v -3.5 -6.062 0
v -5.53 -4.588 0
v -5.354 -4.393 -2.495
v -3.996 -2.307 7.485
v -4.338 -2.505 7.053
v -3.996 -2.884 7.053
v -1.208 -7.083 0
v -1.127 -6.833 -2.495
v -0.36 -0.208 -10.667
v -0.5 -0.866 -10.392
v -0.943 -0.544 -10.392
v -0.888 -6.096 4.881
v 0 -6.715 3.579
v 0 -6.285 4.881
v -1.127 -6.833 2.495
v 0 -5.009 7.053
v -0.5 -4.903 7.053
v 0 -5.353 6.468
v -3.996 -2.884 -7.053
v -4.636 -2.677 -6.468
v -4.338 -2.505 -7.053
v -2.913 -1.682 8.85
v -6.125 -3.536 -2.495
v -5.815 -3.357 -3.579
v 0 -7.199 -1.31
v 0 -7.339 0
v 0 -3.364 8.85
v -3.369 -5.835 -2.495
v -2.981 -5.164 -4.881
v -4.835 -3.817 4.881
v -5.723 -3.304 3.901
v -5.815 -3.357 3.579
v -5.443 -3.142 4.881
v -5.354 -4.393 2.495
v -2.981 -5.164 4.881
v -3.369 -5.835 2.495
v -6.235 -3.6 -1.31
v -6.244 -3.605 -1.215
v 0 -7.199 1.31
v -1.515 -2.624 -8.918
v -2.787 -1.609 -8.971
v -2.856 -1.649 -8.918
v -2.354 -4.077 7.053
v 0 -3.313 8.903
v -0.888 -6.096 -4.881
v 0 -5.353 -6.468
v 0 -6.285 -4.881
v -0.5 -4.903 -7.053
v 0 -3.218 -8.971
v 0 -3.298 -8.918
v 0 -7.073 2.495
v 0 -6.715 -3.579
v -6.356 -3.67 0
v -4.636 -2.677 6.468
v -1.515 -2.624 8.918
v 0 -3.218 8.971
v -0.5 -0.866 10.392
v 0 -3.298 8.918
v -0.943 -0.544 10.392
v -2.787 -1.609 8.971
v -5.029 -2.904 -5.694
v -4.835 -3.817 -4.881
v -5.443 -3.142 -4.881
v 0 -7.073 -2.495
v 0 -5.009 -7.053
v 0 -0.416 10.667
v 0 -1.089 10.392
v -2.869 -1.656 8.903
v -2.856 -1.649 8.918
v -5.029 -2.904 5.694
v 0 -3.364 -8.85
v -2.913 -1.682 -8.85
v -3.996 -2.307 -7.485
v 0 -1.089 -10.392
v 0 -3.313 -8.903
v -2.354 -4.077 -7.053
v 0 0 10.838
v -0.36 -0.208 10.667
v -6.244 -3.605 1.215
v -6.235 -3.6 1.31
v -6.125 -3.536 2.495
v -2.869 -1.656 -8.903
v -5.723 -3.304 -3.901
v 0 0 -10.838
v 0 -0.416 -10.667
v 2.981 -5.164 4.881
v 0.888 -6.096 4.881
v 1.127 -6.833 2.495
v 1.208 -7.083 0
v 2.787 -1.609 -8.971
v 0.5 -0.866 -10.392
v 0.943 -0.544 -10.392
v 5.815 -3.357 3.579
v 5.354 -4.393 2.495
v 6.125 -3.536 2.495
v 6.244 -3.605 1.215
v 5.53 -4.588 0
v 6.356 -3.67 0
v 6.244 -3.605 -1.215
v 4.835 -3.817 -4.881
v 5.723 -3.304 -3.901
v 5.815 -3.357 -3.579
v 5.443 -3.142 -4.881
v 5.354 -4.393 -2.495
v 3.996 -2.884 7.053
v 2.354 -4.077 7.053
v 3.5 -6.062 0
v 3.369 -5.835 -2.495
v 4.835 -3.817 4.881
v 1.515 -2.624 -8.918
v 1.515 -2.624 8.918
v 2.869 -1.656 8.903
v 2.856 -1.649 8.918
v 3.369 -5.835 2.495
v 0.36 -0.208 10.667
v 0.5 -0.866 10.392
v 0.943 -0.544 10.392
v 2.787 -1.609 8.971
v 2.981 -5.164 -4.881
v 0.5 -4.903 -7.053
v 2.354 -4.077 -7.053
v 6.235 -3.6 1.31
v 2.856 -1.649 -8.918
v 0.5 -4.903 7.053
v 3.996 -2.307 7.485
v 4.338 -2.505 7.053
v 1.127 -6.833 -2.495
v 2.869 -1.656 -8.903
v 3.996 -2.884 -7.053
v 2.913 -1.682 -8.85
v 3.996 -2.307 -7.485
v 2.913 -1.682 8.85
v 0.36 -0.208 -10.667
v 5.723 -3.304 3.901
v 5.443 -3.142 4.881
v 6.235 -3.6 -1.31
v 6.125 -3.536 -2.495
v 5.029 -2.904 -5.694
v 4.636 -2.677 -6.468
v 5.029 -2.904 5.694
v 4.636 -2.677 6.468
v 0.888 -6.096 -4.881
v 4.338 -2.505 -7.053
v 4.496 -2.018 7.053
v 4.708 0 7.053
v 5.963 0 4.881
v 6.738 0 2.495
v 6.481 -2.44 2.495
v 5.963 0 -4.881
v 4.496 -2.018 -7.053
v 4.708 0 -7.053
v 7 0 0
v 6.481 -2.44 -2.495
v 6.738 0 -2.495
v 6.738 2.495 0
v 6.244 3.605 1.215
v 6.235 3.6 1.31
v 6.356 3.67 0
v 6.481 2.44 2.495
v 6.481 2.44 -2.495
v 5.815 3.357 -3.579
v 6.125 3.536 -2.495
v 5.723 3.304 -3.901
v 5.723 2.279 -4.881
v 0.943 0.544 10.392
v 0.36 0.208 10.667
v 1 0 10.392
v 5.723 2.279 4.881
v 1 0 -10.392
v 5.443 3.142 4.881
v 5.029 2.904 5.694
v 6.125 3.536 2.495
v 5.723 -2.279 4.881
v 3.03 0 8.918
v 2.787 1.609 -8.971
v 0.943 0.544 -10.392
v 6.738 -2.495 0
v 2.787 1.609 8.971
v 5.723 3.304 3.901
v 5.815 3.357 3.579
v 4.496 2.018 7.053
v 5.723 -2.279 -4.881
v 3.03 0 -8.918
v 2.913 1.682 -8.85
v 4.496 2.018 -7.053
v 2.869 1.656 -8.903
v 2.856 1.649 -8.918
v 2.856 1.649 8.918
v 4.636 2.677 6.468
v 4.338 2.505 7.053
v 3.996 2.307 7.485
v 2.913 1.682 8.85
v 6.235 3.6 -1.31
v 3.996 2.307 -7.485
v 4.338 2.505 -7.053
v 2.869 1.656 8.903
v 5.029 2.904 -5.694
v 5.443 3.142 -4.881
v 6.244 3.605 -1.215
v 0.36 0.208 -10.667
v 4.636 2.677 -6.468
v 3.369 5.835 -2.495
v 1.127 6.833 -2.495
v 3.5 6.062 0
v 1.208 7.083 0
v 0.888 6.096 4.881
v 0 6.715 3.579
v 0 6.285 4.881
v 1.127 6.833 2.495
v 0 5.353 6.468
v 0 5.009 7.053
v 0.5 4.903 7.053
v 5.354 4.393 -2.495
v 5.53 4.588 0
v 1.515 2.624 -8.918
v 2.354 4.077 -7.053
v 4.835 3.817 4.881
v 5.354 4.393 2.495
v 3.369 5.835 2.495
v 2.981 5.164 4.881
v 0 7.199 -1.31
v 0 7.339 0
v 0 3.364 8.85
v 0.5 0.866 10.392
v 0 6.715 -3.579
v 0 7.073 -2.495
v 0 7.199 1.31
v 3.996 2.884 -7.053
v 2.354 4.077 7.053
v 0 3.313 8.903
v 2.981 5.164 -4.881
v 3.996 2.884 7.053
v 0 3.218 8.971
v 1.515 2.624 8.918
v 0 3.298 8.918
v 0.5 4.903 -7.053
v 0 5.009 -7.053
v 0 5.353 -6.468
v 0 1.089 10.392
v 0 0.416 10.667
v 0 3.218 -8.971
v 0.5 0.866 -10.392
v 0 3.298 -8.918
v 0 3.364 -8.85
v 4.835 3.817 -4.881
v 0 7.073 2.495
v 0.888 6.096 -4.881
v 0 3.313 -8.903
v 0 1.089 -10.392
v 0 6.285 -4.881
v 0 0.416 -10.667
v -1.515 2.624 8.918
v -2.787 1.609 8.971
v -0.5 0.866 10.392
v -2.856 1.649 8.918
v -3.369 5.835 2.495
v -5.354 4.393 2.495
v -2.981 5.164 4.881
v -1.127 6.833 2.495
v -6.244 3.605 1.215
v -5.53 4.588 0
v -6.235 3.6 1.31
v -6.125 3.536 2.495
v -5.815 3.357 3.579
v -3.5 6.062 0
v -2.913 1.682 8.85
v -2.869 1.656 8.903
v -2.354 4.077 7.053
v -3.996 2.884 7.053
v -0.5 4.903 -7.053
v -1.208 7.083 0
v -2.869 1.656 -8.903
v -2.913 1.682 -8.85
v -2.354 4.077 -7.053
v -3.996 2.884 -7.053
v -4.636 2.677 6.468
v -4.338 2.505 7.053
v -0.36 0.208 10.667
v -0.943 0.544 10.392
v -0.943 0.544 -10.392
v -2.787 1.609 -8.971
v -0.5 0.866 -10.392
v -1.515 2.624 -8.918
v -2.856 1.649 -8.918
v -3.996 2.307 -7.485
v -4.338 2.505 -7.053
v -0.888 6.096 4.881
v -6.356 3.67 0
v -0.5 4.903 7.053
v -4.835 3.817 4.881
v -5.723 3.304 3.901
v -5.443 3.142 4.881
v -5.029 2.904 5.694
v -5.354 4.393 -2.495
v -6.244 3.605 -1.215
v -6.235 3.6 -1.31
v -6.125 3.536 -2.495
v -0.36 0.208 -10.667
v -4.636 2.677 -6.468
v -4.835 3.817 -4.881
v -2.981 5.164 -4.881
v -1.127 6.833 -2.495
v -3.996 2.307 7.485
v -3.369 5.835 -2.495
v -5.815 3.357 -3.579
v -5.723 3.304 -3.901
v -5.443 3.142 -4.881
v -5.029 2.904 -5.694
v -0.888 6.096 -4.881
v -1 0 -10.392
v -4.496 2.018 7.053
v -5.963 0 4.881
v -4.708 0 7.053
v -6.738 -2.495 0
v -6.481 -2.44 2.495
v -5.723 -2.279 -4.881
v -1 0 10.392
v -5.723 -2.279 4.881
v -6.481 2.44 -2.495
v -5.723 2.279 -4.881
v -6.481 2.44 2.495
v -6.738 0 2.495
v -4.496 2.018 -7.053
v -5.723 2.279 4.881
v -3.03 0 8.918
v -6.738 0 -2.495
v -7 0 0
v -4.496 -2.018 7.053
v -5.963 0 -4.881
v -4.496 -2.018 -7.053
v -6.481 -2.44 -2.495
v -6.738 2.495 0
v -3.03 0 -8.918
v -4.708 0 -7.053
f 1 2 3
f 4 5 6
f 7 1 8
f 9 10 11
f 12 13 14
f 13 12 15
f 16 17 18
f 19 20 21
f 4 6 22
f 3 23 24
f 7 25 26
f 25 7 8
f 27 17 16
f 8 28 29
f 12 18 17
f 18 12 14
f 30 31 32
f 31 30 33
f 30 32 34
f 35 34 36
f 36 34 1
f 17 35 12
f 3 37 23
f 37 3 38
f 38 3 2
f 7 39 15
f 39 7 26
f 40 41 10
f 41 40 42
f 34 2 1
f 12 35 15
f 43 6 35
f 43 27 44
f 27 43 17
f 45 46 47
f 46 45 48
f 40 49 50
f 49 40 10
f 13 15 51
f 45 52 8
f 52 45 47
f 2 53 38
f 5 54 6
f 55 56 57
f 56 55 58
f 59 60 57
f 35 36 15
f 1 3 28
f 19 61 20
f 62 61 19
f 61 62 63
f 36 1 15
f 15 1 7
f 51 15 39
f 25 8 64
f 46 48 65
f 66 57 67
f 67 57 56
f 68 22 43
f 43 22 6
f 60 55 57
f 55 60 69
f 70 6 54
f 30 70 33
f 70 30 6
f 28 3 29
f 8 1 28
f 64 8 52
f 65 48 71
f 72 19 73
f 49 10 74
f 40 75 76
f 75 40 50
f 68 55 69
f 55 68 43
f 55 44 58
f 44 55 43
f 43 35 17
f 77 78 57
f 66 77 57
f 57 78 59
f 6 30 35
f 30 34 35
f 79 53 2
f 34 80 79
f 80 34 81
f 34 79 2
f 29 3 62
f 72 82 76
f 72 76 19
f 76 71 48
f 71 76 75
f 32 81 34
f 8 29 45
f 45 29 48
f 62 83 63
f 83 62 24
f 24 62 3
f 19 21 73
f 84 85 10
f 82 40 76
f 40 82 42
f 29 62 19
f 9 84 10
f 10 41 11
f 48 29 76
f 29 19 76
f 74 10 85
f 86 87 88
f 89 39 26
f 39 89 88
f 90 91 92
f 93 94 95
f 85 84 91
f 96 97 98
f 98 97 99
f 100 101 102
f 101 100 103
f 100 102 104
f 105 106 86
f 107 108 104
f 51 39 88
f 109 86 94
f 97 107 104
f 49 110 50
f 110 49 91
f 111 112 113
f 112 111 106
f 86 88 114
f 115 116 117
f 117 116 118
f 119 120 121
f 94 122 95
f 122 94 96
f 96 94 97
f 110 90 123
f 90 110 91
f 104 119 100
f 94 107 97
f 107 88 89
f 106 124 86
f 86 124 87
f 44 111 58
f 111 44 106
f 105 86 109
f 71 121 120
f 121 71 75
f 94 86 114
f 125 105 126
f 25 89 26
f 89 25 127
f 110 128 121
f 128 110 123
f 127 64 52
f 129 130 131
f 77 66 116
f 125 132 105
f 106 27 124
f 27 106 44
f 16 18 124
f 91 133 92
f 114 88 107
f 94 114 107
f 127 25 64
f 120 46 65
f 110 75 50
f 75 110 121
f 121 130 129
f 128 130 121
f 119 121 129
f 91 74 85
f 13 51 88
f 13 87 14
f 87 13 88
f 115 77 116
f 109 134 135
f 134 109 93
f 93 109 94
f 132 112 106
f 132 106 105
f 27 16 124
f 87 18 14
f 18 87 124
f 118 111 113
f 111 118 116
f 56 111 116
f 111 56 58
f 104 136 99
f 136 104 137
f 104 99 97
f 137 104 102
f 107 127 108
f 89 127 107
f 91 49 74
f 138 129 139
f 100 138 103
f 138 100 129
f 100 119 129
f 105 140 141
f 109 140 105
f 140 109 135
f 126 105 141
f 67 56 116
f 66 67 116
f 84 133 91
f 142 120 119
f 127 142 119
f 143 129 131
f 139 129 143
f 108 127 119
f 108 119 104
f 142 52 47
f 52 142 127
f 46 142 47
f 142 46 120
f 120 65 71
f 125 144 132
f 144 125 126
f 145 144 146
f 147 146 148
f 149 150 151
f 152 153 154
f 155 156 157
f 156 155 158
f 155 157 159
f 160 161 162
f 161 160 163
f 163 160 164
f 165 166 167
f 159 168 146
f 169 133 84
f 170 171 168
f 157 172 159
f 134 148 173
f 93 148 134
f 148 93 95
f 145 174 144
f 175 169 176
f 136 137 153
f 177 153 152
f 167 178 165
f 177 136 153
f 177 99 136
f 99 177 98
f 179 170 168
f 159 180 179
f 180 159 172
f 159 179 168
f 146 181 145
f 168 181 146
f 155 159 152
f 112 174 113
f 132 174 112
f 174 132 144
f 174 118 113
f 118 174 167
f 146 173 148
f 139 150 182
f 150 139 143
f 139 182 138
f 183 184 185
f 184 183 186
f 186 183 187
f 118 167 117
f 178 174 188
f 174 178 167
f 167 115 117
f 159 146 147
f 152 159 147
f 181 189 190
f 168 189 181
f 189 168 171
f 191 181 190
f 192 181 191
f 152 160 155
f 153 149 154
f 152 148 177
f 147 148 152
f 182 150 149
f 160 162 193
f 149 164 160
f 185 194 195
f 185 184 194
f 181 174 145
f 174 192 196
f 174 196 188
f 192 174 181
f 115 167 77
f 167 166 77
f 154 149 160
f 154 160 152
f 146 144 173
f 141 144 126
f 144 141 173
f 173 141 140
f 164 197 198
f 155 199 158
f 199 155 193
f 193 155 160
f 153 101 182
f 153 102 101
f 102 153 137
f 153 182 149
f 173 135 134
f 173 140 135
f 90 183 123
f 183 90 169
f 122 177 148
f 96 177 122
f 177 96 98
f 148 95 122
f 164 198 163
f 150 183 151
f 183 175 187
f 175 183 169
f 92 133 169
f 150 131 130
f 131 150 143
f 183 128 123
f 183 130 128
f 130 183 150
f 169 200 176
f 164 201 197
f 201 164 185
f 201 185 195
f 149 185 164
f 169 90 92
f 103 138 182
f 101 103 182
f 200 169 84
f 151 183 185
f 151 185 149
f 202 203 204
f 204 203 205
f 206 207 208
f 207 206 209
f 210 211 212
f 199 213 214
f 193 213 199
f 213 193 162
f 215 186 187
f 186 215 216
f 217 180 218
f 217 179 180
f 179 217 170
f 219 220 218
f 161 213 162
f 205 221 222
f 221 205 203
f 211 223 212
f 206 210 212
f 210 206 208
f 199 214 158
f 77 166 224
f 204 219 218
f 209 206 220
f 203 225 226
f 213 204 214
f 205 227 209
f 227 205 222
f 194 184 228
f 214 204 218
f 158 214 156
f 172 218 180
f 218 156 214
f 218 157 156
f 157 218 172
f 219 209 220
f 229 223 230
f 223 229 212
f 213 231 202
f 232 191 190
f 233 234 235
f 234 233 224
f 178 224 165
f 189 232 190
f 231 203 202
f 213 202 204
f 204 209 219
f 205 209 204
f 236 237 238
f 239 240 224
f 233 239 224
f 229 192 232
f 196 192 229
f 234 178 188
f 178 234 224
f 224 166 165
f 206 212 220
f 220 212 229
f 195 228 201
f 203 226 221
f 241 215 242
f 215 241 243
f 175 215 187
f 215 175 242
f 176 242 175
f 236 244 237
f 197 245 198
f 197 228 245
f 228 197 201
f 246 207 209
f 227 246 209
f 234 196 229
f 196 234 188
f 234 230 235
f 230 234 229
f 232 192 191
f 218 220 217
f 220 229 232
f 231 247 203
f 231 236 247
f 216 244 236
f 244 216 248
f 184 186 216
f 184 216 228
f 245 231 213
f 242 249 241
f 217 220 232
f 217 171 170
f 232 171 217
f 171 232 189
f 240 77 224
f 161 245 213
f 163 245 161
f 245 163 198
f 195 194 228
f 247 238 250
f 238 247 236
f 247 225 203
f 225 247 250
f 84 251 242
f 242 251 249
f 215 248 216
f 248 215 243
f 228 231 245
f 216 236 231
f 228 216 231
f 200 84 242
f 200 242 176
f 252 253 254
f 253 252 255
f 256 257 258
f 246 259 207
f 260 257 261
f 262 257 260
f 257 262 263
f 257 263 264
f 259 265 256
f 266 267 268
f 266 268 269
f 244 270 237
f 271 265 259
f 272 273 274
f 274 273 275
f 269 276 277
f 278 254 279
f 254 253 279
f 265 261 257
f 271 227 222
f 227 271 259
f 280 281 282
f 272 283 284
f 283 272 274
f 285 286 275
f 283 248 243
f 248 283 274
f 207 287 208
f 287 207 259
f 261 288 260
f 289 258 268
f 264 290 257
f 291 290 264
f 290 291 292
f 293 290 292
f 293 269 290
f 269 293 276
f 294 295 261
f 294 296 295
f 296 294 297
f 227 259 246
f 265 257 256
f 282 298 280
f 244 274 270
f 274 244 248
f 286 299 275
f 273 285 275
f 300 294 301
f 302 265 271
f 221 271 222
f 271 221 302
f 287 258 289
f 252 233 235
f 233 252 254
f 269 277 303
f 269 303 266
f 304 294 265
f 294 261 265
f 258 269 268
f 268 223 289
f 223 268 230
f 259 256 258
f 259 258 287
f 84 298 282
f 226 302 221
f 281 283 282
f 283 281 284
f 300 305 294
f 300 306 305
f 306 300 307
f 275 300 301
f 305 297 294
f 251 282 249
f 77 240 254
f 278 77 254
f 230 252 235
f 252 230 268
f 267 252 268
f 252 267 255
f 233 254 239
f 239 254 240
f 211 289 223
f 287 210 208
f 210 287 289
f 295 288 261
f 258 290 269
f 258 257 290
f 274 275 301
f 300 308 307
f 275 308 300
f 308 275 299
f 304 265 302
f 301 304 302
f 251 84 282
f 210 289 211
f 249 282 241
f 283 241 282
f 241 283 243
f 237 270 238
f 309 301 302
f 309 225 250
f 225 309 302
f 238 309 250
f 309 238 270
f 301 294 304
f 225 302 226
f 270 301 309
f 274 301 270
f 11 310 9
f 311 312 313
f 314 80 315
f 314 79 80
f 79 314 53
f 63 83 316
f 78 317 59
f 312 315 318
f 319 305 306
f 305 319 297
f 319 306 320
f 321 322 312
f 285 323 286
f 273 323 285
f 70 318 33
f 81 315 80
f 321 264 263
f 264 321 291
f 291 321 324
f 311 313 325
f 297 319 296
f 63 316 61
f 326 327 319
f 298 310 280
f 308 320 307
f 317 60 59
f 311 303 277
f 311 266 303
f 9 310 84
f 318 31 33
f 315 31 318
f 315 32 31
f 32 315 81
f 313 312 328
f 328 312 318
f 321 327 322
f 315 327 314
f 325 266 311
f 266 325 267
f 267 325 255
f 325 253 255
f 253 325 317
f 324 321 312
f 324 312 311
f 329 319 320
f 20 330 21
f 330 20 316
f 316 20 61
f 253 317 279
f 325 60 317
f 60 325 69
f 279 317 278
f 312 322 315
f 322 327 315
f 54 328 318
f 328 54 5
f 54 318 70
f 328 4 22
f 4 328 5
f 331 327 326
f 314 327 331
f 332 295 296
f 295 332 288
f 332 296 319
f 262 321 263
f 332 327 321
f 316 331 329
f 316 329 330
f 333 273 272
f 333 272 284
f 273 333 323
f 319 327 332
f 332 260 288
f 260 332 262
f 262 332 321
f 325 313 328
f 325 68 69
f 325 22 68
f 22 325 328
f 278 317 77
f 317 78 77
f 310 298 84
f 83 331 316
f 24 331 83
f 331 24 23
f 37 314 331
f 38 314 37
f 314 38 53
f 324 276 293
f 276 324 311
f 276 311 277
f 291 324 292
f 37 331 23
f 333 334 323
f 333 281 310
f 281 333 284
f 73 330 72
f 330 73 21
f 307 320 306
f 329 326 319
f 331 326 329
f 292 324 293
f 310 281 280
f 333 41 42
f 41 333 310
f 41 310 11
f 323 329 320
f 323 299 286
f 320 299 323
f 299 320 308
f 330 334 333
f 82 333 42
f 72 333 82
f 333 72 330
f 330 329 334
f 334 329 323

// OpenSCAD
//for (z = [-10,-5]) 
//{
//    translate([0, 0, z])
//    cube(size = 1, center = false);
//}
//
//for ( i = [0 : 5] )
//{
//    rotate( i * 360 / 6, [1, 0, 0])
//    translate([0, 10, 0])
//    sphere(r = 1);
//}
//
// for(i = [ [ 0,  0,  0],
//           [10, 12, 10],
//           [20, 24, 20],
//           [30, 36, 30],
//           [40, 48, 40],
//           [50, 60, 50] ])
//{
//    translate(i)
//    cube([50, 15, 10], center = false);
//}
intersection_for(n = [1 : 6])
{
    rotate([0, 0, n * 60])
    {
        translate([5,0,0])
        sphere(r=12);
    }
}
